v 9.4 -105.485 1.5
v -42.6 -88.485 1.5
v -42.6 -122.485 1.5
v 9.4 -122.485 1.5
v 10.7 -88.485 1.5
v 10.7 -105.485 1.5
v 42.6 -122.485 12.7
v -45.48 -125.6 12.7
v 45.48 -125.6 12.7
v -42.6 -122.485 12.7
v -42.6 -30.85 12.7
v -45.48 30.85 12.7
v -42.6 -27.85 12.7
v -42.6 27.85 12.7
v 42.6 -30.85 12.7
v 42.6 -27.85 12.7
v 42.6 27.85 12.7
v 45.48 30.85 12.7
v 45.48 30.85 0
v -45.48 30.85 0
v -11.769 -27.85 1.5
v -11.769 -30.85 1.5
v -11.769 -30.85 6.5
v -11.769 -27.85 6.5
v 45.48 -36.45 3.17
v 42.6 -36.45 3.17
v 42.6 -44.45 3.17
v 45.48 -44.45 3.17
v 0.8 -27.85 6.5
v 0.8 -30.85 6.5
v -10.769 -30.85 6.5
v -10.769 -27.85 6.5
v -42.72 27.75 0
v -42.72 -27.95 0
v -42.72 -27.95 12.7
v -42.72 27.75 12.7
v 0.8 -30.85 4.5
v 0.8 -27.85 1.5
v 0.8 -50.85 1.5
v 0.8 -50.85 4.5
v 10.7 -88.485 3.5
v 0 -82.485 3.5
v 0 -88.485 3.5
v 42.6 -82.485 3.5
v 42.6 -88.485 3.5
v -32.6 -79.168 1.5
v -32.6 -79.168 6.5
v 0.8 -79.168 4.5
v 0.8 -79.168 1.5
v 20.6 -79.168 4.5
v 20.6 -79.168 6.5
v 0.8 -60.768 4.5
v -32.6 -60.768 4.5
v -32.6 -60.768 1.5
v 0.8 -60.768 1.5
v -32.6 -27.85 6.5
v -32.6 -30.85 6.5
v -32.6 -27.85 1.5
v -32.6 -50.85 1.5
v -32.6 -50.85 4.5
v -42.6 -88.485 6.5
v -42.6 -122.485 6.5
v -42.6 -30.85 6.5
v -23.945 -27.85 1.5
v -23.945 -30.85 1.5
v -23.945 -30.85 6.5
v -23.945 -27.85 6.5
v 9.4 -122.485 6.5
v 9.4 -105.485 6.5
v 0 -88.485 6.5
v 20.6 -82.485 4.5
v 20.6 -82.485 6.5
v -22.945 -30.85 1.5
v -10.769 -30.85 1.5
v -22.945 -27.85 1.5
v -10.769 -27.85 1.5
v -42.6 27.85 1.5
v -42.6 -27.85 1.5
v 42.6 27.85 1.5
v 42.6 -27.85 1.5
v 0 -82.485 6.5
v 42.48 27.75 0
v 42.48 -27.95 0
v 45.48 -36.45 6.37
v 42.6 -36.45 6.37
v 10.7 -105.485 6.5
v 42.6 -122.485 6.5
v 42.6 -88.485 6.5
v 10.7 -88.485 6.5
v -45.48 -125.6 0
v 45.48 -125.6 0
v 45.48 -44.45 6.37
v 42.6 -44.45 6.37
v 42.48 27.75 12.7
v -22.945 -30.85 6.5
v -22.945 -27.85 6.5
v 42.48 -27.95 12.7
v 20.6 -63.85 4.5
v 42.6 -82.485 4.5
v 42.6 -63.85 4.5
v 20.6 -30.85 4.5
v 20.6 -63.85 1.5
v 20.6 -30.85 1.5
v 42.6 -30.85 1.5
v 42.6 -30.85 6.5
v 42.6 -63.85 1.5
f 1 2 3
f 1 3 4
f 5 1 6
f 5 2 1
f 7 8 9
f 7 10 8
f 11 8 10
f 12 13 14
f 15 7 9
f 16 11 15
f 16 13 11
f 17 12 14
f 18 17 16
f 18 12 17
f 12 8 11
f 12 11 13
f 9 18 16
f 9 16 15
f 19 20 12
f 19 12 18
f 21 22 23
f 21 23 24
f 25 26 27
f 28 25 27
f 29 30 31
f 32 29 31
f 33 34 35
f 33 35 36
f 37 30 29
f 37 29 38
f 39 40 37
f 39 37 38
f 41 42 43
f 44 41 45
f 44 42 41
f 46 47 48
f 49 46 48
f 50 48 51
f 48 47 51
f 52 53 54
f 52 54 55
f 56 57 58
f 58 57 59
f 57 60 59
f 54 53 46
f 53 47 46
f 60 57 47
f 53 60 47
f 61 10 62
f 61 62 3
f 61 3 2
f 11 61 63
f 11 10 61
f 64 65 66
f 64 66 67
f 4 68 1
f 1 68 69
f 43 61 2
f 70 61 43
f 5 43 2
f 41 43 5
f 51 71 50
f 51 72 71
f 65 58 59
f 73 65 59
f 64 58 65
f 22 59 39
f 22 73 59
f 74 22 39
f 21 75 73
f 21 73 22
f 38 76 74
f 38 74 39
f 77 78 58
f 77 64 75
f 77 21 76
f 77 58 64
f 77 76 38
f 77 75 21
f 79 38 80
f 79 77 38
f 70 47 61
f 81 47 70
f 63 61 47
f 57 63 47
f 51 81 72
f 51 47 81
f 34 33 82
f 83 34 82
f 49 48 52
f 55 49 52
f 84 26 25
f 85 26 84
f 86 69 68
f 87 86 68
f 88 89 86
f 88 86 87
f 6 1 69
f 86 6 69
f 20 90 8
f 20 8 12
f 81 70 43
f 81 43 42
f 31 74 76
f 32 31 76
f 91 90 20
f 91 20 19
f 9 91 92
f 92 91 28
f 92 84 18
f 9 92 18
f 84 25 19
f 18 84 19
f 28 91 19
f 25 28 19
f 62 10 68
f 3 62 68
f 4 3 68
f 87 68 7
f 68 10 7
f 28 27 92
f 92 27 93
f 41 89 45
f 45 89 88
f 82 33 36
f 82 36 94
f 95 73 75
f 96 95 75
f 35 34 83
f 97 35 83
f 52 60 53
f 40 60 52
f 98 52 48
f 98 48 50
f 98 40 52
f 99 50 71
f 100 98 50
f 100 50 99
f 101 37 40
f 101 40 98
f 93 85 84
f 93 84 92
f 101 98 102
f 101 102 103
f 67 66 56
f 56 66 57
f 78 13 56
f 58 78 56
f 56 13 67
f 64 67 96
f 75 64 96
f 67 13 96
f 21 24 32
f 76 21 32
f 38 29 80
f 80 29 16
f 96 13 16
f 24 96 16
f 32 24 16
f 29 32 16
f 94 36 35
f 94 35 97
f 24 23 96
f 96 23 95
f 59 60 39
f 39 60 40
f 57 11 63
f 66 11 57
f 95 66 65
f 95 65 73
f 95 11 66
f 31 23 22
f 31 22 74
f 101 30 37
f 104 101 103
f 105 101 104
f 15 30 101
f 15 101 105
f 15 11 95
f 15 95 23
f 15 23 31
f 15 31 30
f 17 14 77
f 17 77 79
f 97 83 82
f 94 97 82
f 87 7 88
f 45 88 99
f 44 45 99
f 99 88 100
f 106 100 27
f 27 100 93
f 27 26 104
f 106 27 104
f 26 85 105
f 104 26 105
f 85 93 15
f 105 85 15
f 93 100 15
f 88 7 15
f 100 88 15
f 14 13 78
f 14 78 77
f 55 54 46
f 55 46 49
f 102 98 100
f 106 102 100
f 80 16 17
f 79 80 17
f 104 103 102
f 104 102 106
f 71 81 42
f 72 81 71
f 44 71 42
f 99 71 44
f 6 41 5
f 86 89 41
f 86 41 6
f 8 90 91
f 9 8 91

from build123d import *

# Parameters (mm, degrees)
SKETCH_W           = 85.2
SKETCH_H           = 55.7
PAD_DEPTH          = 12.7
SKETCH001_W        = 90.96
SKETCH001_H        = 156.45
PAD001_DEPTH       = 12.7
SKETCH002_W        = 85.2
SKETCH002_H        = 91.6346183773
POCKET_DEPTH       = 6.2
SKETCH003_W        = 52
SKETCH003_H        = 34
POCKET001_DEPTH    = 5
SKETCH004_W        = 22
SKETCH004_H        = 33
POCKET002_DEPTH    = 5
SKETCH005_W        = 8
SKETCH005_H        = 3.2
POCKET003_DEPTH    = 2.88
SKETCH006_W        = 17
SKETCH006_H        = 5
POCKET004_DEPTH    = 1.3
SKETCH007_W        = 42.6
SKETCH007_H        = 6
POCKET005_DEPTH    = 3
SKETCH008_W        = 22
SKETCH008_H        = 18.6346183773
POCKET006_DEPTH    = 2
SKETCH010_W        = 33.4
SKETCH010_H        = 18.4
POCKET007_DEPTH    = 5
SKETCH011_W        = 19.8
SKETCH011_H        = 48.3178648155
POCKET008_DEPTH    = 2
SKETCH012_W        = 33.4
SKETCH012_H        = 29.9178648155
POCKET009_DEPTH    = 2
SKETCH013_W        = 33.4
SKETCH013_H        = 20
POCKET010_DEPTH    = 3
SKETCH014_W        = 85.2
SKETCH014_H        = 55.7
POCKET011_DEPTH    = 11.2
POCKET011_FACE45_W = 33.4
POCKET011_FACE45_H = 3
POCKET012_DEPTH    = 3
POCKET012_FACE23_W = 33.4
POCKET012_FACE23_H = 2
POCKET013_DEPTH    = 3
SKETCH016_W        = 1
SKETCH016_H        = 3
PAD002_DEPTH       = 5
SKETCH015_W        = 1
SKETCH015_H        = 3
PAD003_DEPTH       = 5


with BuildPart() as screen:
    # Sketch → Pad (new body)
    with BuildSketch(Plane.XY):
        with Locations((-0.12, -0.1)):
            Rectangle(SKETCH_W, SKETCH_H)
    extrude(amount=PAD_DEPTH)


with BuildPart() as body001:
    # Sketch001 → Pad001 (new body)
    with BuildSketch(Plane.XY):
        with Locations((0, -47.375)):
            Rectangle(SKETCH001_W, SKETCH001_H)
    extrude(amount=PAD001_DEPTH)

    # Sketch002 (on Face6 of Pad001) → Pocket (cut)
    with BuildSketch(Plane.XY.offset(12.7)):
        with Locations((0, -76.6673091887)):
            Rectangle(SKETCH002_W, SKETCH002_H)
    extrude(amount=-POCKET_DEPTH, mode=Mode.SUBTRACT)

    # Sketch003 (on Face11 of Pocket) → Pocket001 (cut)
    with BuildSketch(Plane.XY.offset(6.5)):
        with Locations((-16.6, -105.4846183773)):
            Rectangle(SKETCH003_W, SKETCH003_H)
    extrude(amount=-POCKET001_DEPTH, mode=Mode.SUBTRACT)

    # Sketch004 (on Face12 of Pocket001) → Pocket002 (cut)
    with BuildSketch(Plane.XY.offset(6.5)):
        with Locations((31.6, -47.35)):
            Rectangle(SKETCH004_W, SKETCH004_H)
    extrude(amount=-POCKET002_DEPTH, mode=Mode.SUBTRACT)

    # Sketch005 (on Face14 of Pocket002) → Pocket003 (cut)
    with BuildSketch(Plane(origin=(42.6, 0, 0), x_dir=(0, -1, 0), z_dir=(-1, 0, 0))):
        with Locations((40.45, 4.77)):
            Rectangle(SKETCH005_W, SKETCH005_H)
    extrude(amount=-POCKET003_DEPTH, mode=Mode.SUBTRACT)

    # Sketch006 (on Face25 of Pocket003) → Pocket004 (cut)
    with BuildSketch(Plane(origin=(9.4, 0, 0), x_dir=(0, -1, 0), z_dir=(-1, 0, 0))):
        with Locations((96.9846183773, 4)):
            Rectangle(SKETCH006_W, SKETCH006_H)
    extrude(amount=-POCKET004_DEPTH, mode=Mode.SUBTRACT)

    # Sketch007 (on Face17 of Pocket004) → Pocket005 (cut)
    with BuildSketch(Plane.XY.offset(6.5)):
        with Locations((21.3, -85.4846183773)):
            Rectangle(SKETCH007_W, SKETCH007_H)
    extrude(amount=-POCKET005_DEPTH, mode=Mode.SUBTRACT)

    # Sketch008 (on Face17 of Pocket005) → Pocket006 (cut)
    with BuildSketch(Plane.XY.offset(6.5)):
        with Locations((31.6, -73.1673091887)):
            Rectangle(SKETCH008_W, SKETCH008_H)
    extrude(amount=-POCKET006_DEPTH, mode=Mode.SUBTRACT)

    # Sketch010 (on Face17 of Pocket006) → Pocket007 (cut)
    with BuildSketch(Plane.XY.offset(6.5)):
        with Locations((-15.9, -69.9678648155)):
            Rectangle(SKETCH010_W, SKETCH010_H)
    extrude(amount=-POCKET007_DEPTH, mode=Mode.SUBTRACT)

    # Sketch011 (on Face17 of Pocket007) → Pocket008 (cut)
    with BuildSketch(Plane.XY.offset(6.5)):
        with Locations((10.7, -55.0089324078)):
            Rectangle(SKETCH011_W, SKETCH011_H)
    extrude(amount=-POCKET008_DEPTH, mode=Mode.SUBTRACT)

    # Sketch012 (on Face17 of Pocket008) → Pocket009 (cut)
    with BuildSketch(Plane.XY.offset(6.5)):
        with Locations((-15.9, -45.8089324078)):
            Rectangle(SKETCH012_W, SKETCH012_H)
    extrude(amount=-POCKET009_DEPTH, mode=Mode.SUBTRACT)

    # Sketch013 (on Face42 of Pocket009) → Pocket010 (cut)
    with BuildSketch(Plane.XY.offset(4.5)):
        with Locations((-15.9, -40.85)):
            Rectangle(SKETCH013_W, SKETCH013_H)
    extrude(amount=-POCKET010_DEPTH, mode=Mode.SUBTRACT)

    # Sketch014 (on Face5 of Pocket010) → Pocket011 (cut)
    with BuildSketch(Plane.XY.offset(12.7)):
        Rectangle(SKETCH014_W, SKETCH014_H)
    extrude(amount=-POCKET011_DEPTH, mode=Mode.SUBTRACT)

    # Pocket011 Face45 → Pocket012 (cut)
    with BuildSketch(Plane(origin=(-15.9, -30.85, 3), x_dir=(-1, 0, 0), z_dir=(0, -1, 0))):
        Rectangle(POCKET011_FACE45_W, POCKET011_FACE45_H)
    extrude(amount=-POCKET012_DEPTH, mode=Mode.SUBTRACT)

    # Pocket012 Face23 → Pocket013 (cut)
    with BuildSketch(Plane(origin=(-15.9, -30.85, 5.5), x_dir=(-1, 0, 0), z_dir=(0, -1, 0))):
        Rectangle(POCKET012_FACE23_W, POCKET012_FACE23_H)
    extrude(amount=-POCKET013_DEPTH, mode=Mode.SUBTRACT)

    # Sketch016 (on Face53 of Pocket013) → Pad002 (join)
    with BuildSketch(Plane.XY.offset(1.5)):
        with Locations((-11.2686472875, -29.35)):
            Rectangle(SKETCH016_W, SKETCH016_H)
    extrude(amount=PAD002_DEPTH)

    # Sketch015 (on Face53 of Pocket013) → Pad003 (join)
    with BuildSketch(Plane.XY.offset(1.5)):
        with Locations((-23.4452128155, -29.35)):
            Rectangle(SKETCH015_W, SKETCH015_H)
    extrude(amount=PAD003_DEPTH)


solid = Compound([screen.part, body001.part])
